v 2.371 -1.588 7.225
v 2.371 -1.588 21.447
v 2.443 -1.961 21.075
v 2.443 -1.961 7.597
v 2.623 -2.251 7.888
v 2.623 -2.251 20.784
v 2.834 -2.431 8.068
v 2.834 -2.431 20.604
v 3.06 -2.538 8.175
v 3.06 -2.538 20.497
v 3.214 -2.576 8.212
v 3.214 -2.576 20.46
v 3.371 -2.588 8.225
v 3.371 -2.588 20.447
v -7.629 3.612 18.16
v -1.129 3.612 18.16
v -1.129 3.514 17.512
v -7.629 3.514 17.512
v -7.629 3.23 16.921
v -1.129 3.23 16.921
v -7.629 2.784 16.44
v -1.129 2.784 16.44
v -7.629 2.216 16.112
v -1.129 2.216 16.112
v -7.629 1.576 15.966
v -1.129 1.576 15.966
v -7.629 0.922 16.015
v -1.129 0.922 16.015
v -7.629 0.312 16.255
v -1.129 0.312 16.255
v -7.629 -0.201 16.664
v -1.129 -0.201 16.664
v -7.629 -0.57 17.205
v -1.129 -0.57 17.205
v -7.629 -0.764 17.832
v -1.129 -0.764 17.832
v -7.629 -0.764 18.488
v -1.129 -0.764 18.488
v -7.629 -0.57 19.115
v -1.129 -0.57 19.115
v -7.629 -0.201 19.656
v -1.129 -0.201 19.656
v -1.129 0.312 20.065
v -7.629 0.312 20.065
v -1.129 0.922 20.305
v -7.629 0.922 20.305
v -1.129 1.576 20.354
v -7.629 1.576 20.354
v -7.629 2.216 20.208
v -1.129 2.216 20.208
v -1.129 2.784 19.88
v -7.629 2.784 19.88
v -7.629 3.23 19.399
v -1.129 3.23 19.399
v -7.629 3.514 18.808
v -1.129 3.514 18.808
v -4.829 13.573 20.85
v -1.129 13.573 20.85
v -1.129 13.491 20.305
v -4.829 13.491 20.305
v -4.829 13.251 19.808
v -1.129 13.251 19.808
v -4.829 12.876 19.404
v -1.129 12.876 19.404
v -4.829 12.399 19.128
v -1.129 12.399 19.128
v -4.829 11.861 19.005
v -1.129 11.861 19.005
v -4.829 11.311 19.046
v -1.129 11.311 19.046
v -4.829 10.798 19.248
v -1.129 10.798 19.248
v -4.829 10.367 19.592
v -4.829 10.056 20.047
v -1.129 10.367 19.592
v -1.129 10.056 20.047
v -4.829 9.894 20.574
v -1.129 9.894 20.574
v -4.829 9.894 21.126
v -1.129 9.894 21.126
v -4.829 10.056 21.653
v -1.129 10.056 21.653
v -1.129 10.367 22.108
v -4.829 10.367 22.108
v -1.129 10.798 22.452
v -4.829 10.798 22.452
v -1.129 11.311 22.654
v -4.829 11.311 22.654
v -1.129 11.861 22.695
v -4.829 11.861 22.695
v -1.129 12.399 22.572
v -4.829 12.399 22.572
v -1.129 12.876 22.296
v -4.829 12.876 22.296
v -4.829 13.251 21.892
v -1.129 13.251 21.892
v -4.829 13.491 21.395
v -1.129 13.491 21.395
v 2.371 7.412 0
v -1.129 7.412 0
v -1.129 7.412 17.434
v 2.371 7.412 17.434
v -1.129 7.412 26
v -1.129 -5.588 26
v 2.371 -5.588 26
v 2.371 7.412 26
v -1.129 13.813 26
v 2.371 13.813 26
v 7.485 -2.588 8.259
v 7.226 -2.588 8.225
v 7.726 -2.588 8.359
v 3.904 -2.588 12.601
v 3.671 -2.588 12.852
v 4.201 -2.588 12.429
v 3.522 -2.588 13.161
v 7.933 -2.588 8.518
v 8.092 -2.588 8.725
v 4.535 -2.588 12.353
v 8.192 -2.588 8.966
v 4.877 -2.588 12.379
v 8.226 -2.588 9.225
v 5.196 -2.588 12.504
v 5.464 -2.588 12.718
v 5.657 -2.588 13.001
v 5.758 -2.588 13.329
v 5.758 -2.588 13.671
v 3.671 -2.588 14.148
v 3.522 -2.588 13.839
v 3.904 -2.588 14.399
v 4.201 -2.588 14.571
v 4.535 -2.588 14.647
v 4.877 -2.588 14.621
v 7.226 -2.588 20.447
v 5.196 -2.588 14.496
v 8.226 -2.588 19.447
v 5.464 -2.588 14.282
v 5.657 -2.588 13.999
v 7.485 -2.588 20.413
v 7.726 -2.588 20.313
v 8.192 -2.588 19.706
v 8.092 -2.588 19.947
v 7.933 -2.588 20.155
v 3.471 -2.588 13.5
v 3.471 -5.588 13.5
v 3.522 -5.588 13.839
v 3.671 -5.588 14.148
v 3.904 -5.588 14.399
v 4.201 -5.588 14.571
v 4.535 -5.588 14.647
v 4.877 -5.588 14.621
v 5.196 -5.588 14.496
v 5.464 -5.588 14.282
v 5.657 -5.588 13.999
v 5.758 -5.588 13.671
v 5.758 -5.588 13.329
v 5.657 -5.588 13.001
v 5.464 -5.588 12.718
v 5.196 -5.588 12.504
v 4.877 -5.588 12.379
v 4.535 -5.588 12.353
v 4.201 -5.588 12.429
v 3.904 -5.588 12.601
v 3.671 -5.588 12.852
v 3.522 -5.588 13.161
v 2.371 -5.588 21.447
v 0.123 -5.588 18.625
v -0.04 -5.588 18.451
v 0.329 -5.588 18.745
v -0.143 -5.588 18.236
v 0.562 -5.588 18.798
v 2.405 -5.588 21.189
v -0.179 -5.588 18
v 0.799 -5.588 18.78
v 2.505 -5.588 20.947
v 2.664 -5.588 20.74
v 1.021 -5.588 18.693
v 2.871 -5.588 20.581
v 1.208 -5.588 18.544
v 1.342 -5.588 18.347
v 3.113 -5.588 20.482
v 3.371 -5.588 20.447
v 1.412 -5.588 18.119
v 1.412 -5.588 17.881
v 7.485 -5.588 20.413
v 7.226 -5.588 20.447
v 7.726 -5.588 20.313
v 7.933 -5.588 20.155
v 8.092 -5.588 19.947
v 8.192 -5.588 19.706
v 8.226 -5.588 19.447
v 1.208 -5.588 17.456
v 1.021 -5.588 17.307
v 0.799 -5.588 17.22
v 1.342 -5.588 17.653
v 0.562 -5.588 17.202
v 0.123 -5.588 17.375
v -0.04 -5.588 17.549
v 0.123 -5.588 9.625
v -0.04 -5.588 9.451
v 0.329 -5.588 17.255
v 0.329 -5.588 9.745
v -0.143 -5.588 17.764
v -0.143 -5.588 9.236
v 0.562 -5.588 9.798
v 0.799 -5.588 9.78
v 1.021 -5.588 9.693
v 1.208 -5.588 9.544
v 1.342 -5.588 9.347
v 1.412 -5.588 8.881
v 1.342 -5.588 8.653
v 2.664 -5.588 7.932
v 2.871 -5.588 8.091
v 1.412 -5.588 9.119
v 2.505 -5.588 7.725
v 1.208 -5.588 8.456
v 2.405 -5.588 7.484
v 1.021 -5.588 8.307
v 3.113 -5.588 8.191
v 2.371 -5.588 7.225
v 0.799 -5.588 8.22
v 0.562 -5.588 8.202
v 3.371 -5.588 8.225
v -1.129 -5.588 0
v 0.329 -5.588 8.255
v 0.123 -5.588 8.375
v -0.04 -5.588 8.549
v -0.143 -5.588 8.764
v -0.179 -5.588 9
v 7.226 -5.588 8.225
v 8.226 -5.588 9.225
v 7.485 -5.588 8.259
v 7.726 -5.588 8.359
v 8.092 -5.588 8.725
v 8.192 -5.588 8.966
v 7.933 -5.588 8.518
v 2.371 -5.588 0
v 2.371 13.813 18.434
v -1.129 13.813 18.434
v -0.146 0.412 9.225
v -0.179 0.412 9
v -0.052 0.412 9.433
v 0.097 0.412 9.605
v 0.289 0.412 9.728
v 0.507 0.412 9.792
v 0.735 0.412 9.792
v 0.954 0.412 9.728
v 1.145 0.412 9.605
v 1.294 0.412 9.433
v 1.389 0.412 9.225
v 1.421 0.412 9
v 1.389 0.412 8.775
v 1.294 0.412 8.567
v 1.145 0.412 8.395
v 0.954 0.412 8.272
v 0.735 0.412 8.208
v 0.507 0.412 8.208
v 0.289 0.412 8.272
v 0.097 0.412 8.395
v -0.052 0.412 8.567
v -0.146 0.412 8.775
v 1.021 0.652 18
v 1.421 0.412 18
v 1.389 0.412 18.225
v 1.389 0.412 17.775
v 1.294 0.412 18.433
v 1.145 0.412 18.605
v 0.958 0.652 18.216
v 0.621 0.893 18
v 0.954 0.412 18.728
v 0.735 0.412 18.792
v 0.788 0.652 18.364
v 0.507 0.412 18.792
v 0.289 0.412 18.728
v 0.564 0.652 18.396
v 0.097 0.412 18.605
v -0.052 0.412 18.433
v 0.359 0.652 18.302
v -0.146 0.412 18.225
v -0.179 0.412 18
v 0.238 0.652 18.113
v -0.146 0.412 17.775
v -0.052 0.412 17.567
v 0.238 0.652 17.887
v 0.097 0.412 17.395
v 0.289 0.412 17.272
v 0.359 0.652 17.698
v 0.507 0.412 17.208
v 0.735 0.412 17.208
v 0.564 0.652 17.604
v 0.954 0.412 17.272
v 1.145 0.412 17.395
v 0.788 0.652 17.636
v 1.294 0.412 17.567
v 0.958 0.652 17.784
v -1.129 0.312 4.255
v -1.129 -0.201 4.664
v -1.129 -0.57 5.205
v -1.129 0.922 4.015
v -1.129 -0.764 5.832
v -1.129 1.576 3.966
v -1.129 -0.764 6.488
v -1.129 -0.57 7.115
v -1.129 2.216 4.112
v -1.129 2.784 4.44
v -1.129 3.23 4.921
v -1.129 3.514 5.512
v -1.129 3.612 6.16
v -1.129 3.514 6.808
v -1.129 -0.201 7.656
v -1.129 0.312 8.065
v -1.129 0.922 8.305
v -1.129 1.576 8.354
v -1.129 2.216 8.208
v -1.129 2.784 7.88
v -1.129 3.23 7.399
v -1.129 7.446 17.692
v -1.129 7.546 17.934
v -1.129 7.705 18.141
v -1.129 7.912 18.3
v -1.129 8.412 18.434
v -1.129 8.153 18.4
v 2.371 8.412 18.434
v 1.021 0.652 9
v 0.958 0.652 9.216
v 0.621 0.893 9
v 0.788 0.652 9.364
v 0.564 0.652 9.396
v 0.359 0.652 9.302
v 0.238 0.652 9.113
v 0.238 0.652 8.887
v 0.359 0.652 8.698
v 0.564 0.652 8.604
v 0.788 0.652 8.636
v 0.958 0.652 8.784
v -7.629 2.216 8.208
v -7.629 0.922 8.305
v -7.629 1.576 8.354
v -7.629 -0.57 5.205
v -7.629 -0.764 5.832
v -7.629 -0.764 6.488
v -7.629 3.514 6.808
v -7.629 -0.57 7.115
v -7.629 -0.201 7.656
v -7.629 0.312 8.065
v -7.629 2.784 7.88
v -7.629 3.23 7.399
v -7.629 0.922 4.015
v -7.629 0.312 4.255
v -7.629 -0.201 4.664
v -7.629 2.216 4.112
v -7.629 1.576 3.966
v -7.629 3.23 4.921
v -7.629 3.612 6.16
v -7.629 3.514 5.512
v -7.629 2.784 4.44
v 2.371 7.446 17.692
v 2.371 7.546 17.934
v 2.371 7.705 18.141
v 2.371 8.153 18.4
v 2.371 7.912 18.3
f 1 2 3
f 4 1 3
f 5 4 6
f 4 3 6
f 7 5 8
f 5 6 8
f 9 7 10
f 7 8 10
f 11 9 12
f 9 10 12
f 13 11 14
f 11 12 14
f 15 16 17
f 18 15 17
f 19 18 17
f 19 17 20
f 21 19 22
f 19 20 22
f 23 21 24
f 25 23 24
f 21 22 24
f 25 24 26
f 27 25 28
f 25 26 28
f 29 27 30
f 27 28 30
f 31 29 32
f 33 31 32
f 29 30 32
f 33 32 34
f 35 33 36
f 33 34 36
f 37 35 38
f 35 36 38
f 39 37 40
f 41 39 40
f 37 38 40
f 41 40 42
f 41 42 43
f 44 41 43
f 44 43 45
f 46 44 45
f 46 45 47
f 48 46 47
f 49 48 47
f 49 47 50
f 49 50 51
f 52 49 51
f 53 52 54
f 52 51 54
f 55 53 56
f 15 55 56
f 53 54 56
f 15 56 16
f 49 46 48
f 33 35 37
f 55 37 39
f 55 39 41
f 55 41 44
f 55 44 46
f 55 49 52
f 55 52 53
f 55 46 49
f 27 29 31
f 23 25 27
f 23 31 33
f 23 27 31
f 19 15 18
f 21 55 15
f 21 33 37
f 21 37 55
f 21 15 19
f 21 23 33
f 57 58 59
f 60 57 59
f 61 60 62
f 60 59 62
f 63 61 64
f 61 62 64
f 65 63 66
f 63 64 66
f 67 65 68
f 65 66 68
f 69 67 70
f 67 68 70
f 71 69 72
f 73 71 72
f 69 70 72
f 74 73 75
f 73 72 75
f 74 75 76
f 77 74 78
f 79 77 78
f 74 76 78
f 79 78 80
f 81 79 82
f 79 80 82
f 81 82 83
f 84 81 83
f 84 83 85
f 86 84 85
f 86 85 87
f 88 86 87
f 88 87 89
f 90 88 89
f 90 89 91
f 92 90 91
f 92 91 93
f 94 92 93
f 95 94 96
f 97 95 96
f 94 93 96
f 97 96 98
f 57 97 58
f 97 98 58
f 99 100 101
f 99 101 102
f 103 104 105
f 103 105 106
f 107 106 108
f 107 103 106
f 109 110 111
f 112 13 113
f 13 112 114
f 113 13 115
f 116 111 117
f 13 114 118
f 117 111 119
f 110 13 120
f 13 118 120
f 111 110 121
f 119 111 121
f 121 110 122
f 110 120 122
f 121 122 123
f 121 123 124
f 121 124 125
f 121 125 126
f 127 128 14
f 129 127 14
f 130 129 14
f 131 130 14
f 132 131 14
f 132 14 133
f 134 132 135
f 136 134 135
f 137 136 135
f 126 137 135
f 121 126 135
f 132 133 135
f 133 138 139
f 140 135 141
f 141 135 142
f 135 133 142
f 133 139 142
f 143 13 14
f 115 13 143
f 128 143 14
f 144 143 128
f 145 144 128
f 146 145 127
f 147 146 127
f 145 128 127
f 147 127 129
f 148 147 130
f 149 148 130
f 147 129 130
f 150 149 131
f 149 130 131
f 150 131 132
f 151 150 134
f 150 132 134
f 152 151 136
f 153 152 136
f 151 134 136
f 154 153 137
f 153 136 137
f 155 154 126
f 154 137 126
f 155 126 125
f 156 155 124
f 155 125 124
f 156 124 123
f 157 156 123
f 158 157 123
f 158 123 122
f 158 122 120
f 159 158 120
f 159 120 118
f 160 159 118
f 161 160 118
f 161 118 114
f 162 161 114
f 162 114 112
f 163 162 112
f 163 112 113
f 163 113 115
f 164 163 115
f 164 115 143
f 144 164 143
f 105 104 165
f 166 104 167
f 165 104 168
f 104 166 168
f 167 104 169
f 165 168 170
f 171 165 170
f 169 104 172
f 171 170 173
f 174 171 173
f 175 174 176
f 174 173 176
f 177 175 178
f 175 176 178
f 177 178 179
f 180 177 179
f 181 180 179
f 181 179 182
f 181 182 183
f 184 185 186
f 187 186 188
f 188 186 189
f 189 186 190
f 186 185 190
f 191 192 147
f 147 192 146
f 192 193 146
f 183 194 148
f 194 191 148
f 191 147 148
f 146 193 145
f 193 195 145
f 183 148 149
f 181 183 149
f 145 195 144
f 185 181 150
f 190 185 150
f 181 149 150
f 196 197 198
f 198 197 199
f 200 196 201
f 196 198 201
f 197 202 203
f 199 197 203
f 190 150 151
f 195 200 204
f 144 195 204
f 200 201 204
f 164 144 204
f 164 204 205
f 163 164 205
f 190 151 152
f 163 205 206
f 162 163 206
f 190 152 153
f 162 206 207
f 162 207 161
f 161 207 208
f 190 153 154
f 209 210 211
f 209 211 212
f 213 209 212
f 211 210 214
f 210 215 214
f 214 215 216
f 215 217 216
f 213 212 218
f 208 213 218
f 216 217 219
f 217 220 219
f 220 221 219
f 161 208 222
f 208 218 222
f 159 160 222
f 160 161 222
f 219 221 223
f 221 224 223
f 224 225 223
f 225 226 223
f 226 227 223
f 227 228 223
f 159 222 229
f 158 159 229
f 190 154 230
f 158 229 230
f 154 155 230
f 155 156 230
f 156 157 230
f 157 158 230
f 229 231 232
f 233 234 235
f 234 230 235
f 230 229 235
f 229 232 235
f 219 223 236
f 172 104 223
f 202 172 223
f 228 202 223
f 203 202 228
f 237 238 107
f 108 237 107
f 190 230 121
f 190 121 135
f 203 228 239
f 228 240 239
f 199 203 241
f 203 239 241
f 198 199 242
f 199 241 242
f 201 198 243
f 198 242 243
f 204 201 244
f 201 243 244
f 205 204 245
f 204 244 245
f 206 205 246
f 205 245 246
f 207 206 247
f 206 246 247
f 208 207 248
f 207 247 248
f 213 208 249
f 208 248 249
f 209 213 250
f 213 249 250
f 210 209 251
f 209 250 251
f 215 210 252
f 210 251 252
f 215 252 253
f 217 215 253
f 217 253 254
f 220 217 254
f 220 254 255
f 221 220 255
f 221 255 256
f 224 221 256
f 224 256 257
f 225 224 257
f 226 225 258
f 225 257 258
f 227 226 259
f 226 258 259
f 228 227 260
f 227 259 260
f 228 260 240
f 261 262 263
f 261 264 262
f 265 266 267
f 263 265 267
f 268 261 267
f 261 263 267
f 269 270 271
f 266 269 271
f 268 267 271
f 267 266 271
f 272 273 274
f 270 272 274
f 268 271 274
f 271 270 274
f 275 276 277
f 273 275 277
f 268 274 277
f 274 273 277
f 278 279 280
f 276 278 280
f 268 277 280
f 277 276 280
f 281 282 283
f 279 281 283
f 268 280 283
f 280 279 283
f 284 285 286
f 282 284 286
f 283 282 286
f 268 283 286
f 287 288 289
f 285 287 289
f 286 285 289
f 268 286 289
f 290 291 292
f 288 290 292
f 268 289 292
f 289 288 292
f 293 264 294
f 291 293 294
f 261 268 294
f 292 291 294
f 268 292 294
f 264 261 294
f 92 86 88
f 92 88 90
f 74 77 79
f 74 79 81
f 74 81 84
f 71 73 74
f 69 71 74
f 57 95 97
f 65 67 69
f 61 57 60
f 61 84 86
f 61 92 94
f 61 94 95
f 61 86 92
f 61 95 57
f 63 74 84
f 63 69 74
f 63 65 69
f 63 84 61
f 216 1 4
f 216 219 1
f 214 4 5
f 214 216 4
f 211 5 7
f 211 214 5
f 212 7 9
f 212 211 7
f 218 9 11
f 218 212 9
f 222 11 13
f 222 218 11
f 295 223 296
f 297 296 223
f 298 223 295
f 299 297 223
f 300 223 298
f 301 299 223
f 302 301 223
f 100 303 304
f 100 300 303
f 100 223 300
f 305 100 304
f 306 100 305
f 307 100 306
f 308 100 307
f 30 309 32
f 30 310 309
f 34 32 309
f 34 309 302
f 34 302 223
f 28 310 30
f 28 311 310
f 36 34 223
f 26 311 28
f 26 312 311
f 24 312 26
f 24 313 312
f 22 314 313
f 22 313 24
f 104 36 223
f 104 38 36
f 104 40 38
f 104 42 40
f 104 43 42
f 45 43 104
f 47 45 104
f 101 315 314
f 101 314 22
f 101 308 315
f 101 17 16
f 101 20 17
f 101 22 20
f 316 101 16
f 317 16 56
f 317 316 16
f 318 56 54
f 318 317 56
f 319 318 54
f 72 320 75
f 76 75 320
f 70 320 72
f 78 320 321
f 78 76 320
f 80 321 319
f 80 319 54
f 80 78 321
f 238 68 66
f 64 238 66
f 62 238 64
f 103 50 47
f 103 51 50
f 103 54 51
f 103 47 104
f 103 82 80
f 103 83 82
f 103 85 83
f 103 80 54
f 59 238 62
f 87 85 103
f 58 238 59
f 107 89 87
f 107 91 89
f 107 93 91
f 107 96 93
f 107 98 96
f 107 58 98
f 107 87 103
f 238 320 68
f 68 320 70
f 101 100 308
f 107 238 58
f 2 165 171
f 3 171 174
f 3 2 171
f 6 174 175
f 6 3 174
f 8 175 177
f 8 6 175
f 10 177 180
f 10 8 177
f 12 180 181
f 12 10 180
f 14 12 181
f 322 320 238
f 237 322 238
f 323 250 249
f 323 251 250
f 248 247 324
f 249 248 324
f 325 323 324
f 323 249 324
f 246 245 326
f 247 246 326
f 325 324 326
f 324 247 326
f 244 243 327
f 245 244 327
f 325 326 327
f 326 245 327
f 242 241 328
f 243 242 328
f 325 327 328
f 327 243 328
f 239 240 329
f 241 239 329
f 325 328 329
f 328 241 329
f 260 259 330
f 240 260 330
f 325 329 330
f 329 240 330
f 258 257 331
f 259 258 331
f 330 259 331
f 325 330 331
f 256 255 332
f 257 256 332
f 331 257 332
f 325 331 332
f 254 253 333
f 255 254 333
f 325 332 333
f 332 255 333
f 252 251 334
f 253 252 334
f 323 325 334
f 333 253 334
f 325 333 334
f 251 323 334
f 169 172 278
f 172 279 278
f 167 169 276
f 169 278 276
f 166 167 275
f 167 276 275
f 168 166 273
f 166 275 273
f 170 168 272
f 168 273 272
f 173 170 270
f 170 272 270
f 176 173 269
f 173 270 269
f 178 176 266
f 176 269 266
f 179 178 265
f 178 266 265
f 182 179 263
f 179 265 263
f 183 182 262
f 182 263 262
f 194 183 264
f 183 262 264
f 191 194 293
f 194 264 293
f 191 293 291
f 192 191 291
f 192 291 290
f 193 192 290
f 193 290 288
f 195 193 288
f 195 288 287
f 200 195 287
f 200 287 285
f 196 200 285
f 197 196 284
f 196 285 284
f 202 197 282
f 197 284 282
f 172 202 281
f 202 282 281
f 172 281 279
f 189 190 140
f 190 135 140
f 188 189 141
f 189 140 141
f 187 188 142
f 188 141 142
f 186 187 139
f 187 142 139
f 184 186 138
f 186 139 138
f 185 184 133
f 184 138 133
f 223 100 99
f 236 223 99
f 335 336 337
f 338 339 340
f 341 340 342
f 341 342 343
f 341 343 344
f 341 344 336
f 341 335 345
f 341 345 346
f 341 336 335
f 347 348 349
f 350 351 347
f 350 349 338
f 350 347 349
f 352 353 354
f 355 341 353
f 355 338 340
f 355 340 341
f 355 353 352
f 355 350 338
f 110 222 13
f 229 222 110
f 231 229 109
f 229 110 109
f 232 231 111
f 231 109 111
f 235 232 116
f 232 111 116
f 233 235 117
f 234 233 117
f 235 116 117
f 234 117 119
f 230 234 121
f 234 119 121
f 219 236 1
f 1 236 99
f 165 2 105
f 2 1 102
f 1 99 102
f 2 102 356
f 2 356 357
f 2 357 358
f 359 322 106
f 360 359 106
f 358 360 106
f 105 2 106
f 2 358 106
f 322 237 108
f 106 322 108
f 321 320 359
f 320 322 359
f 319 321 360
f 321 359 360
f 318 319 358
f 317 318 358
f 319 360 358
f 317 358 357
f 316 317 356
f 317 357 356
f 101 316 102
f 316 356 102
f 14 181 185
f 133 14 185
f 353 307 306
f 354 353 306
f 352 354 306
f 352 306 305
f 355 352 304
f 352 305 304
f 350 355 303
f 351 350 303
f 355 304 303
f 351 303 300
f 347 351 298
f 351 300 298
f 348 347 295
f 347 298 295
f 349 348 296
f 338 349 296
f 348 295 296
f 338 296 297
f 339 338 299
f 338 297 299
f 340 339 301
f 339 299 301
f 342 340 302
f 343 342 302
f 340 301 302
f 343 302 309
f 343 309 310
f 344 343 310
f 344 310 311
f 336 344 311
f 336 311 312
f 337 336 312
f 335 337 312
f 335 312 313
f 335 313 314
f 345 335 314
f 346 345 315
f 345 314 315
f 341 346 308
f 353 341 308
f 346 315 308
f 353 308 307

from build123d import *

# Parameters (mm, degrees)
SKETCH_1_W             = 3.5
SKETCH_1_H             = 13
EXTRUDE_1_DEPTH        = 26
SKETCH_3_R             = 2.2
EXTRUDE_3_DEPTH        = 6.5
HOLE_WIZARD_M2_1_D     = 1.6
HOLE_WIZARD_M2_1_DEPTH = 6
HOLE_WIZARD_M2_1_TIP   = 0.480688495
SKETCH_6_W             = 5.854472115
SKETCH_6_H             = 12.222775643
EXTRUDE_4_DEPTH        = 3
F_2_0MM_1_D            = 2.3
F_2_0MM_1_DEPTH        = 4.15
F_2_0MM_1_TIP          = 0.690989712
FILLET_2_R             = 1
FILLET_3_R             = 1
FILLET_4_R             = 1
FILLET_5_R             = 1
FILLET_6_R             = 1
SKETCH_9_W             = 7.566336663
SKETCH_9_H             = 6.401025682
EXTRUDE_5_DEPTH        = 3.5
SKETCH_10_R            = 1.85
EXTRUDE_6_DEPTH        = 3.7
FILLET_7_R             = 1


with BuildPart() as part:
    # 草图1 → 凸台-拉伸1 (new body)
    with BuildSketch(Plane.XY):
        with Locations((0.621335505, 0.911868233)):
            Rectangle(SKETCH_1_W, SKETCH_1_H)
    extrude(amount=EXTRUDE_1_DEPTH)

    # 草图3 → 凸台-拉伸3 (add)
    with BuildSketch(Plane.ZY.offset(1.128664495)):
        with Locations(Location((6.16, 1.411868233, 0), (0, 0, 90))):
            Circle(SKETCH_3_R)
        with Locations(Location((18.16, 1.411868233, 0), (0, 0, 90))):
            Circle(SKETCH_3_R)
    extrude(amount=EXTRUDE_3_DEPTH)

    # M2 螺纹孔1
    with Locations(Plane.XZ.offset(5.588131767)):
        with Locations((0.621335505, 9), (0.621335505, 18)):
            Hole(HOLE_WIZARD_M2_1_D / 2, depth=HOLE_WIZARD_M2_1_DEPTH)
            with Locations((0, 0, -(HOLE_WIZARD_M2_1_DEPTH + HOLE_WIZARD_M2_1_TIP / 2))):  # 118° drill point
                Cone(0, HOLE_WIZARD_M2_1_D / 2, HOLE_WIZARD_M2_1_TIP, mode=Mode.SUBTRACT)

    # 草图6 → 凸台-拉伸4 (add)
    with BuildSketch(Plane.XZ.offset(5.588131767)):
        with Locations((5.298571563, 14.336084675)):
            Rectangle(SKETCH_6_W, SKETCH_6_H)
    extrude(amount=-EXTRUDE_4_DEPTH)

    # Ø2.0mm 暗销孔1
    with Locations(Plane.XZ.offset(5.588131767)):
        with Locations((4.621335505, 13.5)):
            Hole(F_2_0MM_1_D / 2, depth=F_2_0MM_1_DEPTH)
            with Locations((0, 0, -(F_2_0MM_1_DEPTH + F_2_0MM_1_TIP / 2))):  # 118° drill point
                Cone(0, F_2_0MM_1_D / 2, F_2_0MM_1_TIP, mode=Mode.SUBTRACT)

    # 圆角2
    fillet_2_edges = [part.edges().sort_by_distance(p)[0] for p in [
        (2.371335505, -2.588131767, 14.336084675),
    ]]
    fillet(fillet_2_edges, radius=FILLET_2_R)

    # 圆角3
    fillet_3_edges = [part.edges().sort_by_distance(p)[0] for p in [
        (2.371335505, -3.588131767, 20.447472496),
    ]]
    fillet(fillet_3_edges, radius=FILLET_3_R)

    # 圆角4
    fillet_4_edges = [part.edges().sort_by_distance(p)[0] for p in [
        (2.371335505, -3.588131767, 8.224696853),
    ]]
    fillet(fillet_4_edges, radius=FILLET_4_R)

    # 圆角5
    fillet_5_edges = [part.edges().sort_by_distance(p)[0] for p in [
        (8.22580762, -4.088131767, 8.224696853),
    ]]
    fillet(fillet_5_edges, radius=FILLET_5_R)

    # 圆角6
    fillet_6_edges = [part.edges().sort_by_distance(p)[0] for p in [
        (8.22580762, -4.088131767, 20.447472496),
    ]]
    fillet(fillet_6_edges, radius=FILLET_6_R)

    # 草图9 → 凸台-拉伸5 (add)
    with BuildSketch(Plane.ZY.offset(1.128664495)):
        with Locations((22.216831668, 10.612381074)):
            Rectangle(SKETCH_9_W, SKETCH_9_H)
    extrude(amount=-EXTRUDE_5_DEPTH)

    # 草图10 → 凸台-拉伸6 (add)
    with BuildSketch(Plane.ZY.offset(1.128664495)):
        with Locations(Location((20.85, 11.722893915, 0), (0, 0, 90))):
            Circle(SKETCH_10_R)
    extrude(amount=EXTRUDE_6_DEPTH)

    # 圆角7
    fillet_7_edges = [part.edges().sort_by_distance(p)[0] for p in [
        (0.621335505, 7.411868233, 18.433663337),
    ]]
    fillet(fillet_7_edges, radius=FILLET_7_R)


solid = part.part
